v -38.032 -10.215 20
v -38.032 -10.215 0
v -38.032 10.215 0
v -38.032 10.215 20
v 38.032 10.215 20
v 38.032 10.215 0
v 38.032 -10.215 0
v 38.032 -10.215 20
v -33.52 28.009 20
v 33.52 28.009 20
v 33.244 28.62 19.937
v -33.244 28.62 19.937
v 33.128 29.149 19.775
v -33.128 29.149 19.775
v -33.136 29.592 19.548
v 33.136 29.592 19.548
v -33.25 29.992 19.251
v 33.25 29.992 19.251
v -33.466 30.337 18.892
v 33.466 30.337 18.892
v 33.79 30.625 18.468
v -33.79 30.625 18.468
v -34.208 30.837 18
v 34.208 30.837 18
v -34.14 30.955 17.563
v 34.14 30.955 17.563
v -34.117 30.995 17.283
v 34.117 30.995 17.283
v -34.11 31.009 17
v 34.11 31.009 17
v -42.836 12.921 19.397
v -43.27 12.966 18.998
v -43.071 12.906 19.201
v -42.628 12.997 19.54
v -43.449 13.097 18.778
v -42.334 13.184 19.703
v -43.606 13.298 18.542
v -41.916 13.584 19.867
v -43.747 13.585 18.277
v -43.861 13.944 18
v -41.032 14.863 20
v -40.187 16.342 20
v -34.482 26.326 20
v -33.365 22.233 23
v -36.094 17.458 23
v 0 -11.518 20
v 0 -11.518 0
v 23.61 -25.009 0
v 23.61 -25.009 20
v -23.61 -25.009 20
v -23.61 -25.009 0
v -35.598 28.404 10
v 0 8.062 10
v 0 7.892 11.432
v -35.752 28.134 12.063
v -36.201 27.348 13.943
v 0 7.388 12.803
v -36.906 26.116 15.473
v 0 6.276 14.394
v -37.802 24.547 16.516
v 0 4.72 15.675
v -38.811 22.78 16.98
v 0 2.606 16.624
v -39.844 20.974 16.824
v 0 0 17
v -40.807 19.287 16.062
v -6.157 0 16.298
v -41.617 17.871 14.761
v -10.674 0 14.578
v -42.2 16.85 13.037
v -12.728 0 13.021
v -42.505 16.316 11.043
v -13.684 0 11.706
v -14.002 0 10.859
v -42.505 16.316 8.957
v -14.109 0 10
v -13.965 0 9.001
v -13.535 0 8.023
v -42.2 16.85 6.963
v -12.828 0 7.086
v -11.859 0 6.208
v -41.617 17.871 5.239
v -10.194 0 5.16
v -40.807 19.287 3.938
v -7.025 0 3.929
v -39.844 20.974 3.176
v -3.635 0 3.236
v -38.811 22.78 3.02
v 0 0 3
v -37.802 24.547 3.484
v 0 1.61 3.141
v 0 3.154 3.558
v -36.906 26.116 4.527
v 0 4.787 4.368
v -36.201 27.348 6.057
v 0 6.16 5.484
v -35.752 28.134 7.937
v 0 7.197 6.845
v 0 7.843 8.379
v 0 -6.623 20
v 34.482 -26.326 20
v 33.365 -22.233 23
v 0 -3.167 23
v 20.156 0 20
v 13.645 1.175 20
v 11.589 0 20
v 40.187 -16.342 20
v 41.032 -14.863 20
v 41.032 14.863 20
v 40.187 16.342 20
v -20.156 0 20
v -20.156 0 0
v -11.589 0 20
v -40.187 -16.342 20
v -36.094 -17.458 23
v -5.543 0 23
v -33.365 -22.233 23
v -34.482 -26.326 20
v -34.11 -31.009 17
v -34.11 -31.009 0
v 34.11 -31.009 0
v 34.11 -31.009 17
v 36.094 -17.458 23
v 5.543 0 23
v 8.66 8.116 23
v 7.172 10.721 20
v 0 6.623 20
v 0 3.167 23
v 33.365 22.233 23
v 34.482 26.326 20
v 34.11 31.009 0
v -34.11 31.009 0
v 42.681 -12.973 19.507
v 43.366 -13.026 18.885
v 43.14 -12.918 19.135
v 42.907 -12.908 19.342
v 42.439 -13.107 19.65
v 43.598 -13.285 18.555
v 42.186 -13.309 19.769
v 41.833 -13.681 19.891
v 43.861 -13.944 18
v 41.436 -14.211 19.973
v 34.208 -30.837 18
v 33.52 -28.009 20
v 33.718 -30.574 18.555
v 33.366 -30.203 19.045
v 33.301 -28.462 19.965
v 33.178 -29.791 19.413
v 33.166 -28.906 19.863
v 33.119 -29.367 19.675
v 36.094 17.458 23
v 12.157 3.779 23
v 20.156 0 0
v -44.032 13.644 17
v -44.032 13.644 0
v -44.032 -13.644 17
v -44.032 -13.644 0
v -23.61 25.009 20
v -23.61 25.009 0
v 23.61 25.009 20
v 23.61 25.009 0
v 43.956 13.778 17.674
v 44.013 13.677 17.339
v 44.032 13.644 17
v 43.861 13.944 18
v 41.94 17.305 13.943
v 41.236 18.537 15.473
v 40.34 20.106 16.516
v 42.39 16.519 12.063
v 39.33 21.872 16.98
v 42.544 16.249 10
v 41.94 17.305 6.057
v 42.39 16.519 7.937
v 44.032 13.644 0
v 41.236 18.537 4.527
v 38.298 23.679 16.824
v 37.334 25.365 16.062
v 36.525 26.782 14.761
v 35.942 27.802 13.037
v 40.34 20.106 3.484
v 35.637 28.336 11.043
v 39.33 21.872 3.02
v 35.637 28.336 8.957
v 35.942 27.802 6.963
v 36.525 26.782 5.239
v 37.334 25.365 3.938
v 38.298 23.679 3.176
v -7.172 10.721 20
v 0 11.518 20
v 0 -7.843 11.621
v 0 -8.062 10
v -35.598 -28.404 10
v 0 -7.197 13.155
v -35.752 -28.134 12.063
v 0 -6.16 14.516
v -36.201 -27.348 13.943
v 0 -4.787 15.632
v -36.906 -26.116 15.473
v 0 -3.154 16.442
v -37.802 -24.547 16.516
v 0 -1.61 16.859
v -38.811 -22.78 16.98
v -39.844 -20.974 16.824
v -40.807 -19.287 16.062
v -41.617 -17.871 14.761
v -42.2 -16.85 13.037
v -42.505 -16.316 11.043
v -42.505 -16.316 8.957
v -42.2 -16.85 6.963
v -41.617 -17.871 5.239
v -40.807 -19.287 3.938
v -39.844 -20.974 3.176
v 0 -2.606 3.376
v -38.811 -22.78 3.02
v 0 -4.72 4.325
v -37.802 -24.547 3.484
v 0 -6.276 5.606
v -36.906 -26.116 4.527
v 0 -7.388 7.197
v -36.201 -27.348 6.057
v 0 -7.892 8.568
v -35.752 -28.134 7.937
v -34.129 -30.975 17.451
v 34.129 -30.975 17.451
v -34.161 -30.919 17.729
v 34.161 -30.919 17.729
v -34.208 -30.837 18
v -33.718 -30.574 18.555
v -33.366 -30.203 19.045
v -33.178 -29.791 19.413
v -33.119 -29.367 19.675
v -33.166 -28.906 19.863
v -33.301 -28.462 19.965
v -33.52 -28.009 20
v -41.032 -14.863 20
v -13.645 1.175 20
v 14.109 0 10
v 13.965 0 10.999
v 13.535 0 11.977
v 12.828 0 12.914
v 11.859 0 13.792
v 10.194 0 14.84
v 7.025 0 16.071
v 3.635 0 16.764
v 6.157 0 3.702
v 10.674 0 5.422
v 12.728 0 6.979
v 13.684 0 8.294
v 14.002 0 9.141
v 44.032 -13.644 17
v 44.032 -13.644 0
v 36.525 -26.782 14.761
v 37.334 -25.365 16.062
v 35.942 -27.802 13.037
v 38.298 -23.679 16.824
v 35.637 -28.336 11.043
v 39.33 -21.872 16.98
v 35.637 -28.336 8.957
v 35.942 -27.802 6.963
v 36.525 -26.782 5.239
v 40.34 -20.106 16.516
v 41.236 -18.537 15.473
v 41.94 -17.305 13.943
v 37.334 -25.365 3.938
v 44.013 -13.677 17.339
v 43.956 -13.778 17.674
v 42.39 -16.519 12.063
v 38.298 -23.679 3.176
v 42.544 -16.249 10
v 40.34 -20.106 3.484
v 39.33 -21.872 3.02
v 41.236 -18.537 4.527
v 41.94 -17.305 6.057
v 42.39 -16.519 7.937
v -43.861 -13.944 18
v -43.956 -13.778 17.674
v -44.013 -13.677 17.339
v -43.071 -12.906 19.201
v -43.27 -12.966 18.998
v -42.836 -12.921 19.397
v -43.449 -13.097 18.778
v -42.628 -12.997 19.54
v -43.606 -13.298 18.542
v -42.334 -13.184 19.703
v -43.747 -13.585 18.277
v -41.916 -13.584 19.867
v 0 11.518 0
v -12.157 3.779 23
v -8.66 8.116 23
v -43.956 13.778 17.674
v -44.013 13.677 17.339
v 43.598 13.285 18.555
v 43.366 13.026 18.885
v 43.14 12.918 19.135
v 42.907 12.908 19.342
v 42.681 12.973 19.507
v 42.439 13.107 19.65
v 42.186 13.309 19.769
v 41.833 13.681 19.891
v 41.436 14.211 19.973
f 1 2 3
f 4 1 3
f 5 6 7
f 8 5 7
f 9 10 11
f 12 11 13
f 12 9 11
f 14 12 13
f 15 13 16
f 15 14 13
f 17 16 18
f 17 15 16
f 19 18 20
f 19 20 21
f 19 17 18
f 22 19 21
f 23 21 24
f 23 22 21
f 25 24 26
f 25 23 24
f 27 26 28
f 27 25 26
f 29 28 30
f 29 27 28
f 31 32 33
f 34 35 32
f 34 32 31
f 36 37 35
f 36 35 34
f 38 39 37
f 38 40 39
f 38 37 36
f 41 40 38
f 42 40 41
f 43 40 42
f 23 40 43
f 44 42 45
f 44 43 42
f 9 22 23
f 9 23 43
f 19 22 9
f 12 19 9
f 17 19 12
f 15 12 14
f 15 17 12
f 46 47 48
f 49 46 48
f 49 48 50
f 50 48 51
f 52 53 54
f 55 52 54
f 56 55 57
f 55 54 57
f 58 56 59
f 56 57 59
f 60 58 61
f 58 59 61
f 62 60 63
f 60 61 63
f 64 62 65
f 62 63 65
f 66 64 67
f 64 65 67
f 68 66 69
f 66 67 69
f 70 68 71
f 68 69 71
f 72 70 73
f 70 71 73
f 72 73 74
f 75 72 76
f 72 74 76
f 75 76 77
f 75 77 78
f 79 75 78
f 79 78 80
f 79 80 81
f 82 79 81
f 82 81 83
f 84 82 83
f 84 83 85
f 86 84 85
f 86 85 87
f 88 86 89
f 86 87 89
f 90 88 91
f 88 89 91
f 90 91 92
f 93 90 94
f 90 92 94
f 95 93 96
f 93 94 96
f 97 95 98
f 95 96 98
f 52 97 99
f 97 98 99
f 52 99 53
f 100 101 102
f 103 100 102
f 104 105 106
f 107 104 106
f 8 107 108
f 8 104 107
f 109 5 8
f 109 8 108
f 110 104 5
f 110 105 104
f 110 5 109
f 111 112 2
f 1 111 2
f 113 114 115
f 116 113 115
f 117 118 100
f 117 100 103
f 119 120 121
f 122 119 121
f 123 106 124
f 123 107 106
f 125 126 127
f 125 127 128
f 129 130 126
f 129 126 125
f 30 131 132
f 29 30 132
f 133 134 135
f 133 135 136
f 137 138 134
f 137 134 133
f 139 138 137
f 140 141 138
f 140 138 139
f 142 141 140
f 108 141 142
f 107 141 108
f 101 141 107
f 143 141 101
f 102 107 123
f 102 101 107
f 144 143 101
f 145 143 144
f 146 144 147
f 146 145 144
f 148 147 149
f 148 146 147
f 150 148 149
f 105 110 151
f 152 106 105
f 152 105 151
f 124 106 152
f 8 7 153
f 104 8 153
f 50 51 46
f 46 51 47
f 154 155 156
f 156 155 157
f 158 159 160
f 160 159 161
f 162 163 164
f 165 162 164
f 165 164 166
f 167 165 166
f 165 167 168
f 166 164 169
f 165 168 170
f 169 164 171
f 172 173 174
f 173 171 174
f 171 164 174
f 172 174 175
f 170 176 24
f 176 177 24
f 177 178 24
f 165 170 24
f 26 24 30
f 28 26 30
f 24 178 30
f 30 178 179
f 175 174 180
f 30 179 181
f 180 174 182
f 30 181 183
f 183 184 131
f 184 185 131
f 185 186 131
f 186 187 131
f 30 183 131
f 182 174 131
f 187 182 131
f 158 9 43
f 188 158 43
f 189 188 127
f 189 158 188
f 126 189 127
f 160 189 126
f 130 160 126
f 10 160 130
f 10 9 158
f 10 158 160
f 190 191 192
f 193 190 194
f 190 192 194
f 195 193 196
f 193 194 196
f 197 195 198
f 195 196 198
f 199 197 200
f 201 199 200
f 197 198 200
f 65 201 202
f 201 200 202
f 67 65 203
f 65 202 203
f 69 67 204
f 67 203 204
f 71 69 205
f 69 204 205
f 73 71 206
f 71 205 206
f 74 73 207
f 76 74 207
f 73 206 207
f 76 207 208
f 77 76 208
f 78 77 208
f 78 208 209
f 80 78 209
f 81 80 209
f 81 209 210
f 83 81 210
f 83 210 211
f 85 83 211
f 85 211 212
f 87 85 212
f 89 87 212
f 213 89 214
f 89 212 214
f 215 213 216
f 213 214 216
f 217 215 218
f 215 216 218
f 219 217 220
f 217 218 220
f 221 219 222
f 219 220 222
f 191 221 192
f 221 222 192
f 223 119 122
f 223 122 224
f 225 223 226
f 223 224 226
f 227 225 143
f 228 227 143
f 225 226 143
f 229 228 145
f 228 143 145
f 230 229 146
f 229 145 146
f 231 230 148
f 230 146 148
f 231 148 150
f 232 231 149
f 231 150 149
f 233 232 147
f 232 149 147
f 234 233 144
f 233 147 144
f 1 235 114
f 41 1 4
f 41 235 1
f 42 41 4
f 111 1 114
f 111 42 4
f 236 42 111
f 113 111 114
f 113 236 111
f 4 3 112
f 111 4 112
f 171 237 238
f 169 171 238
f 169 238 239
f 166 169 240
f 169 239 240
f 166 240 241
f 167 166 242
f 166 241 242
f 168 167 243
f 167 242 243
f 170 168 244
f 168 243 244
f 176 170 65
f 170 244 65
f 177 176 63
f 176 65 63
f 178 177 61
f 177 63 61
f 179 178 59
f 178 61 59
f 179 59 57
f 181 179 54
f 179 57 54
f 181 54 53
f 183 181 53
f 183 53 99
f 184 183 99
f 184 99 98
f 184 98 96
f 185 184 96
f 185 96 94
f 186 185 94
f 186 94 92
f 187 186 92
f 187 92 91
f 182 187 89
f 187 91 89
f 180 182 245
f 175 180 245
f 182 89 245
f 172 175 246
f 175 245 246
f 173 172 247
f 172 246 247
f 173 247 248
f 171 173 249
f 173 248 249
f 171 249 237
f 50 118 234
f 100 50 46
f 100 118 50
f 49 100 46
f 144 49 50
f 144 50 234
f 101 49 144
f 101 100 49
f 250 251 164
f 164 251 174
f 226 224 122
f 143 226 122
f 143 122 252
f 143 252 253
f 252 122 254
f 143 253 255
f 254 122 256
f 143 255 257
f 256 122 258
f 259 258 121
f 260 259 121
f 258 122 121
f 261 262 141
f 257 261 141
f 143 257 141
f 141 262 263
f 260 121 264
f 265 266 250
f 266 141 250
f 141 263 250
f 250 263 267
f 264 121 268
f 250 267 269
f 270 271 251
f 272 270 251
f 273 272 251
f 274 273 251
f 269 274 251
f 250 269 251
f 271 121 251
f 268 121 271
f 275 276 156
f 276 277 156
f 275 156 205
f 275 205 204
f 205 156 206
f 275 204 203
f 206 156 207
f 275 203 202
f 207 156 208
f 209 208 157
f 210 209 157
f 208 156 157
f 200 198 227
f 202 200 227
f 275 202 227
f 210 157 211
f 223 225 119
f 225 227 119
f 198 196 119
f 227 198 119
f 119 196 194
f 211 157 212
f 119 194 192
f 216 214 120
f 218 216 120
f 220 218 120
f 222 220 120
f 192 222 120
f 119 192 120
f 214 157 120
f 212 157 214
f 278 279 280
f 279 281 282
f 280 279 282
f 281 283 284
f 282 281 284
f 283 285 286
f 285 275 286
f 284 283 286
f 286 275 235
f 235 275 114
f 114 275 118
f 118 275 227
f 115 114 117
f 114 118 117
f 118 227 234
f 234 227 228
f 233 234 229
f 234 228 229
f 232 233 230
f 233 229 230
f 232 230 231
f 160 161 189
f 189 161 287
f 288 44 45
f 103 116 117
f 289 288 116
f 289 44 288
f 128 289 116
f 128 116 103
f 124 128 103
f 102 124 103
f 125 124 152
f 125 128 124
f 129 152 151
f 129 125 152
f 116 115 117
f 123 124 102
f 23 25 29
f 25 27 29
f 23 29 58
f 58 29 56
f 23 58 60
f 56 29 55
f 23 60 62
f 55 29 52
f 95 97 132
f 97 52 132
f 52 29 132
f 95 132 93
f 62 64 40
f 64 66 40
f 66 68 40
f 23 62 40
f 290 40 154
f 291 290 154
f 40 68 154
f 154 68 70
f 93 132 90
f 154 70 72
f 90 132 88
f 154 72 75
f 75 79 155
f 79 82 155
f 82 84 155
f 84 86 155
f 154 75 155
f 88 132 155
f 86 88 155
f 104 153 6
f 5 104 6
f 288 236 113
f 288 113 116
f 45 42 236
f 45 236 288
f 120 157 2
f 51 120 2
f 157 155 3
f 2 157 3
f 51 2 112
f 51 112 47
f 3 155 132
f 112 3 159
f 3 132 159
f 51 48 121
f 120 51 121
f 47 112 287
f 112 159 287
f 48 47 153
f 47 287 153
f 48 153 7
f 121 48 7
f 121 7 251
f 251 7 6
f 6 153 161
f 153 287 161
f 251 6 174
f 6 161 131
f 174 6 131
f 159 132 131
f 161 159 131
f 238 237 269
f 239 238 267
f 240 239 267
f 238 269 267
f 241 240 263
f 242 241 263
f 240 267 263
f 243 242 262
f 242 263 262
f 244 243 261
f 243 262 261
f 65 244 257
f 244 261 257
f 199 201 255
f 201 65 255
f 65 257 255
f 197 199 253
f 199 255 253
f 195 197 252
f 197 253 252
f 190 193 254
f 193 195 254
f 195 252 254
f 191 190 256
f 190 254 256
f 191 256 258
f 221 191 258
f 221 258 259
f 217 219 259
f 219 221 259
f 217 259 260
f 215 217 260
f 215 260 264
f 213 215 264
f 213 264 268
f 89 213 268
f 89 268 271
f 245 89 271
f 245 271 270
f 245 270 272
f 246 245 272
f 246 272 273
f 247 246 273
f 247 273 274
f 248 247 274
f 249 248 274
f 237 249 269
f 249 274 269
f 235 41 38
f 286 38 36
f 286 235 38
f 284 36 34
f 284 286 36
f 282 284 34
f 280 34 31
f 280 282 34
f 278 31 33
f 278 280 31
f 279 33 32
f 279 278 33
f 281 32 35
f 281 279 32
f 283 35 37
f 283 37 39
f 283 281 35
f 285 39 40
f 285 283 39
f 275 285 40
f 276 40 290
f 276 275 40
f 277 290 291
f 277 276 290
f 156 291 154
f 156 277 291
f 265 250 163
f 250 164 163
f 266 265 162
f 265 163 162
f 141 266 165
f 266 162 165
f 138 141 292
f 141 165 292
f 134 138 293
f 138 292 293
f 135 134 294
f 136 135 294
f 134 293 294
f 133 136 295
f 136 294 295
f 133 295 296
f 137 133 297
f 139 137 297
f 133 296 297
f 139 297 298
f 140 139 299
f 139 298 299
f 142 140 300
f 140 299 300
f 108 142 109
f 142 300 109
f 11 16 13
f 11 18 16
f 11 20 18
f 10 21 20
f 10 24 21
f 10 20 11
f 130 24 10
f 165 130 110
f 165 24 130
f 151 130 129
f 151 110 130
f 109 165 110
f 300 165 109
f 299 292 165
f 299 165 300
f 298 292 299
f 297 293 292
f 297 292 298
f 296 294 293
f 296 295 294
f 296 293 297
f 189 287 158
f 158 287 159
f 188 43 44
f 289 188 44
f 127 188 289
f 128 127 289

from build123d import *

# Parameters (mm, degrees)
F1_DEPTH      = 20
F2_R          = 7
F3_DEPTH      = 98.6163846154
F3_DEPTH_BACK = 8.6163846154
F4_R          = 7
F5_DEPTH      = 98.6163846154
F5_DEPTH_BACK = 8.6163846154
F7_DEPTH      = 3
F8_T4_DEPTH   = 57.4298435113
F8_T9_DEPTH   = 57.4298435113
F8_T14_DEPTH  = 56.5459149398
F8_T19_DEPTH  = 56.5459149398
F8_T24_DEPTH  = 56.5459149398
F8_T29_DEPTH  = 56.5459149398
F8_T34_DEPTH  = 57.4298435113
F8_T39_DEPTH  = 57.4298435113
F9_T1_DEPTH   = 31.2168298797
F9_T3_DEPTH   = 31.2168298797
F9_T5_DEPTH   = 31.2168298797
F10_R         = 3


# Not quite as in the source:
# - a fillet or chamfer that OpenCascade refuses, or shapes differently, is made with other operations: its cross-section is extruded or revolved along the edge and cut away or added


with BuildPart() as f1:
    # F0 (on Top) → F1 (new body)
    with BuildSketch(Plane.XY):
        Polygon((-23.609552012, 25.0086836473), (0, 25.0086836473), (23.609552012, 25.0086836473), (34.109552012, 31.0086836473), (-34.109552012, 31.0086836473), align=None)
        Polygon((0, 11.517511069), (-23.609552012, 25.0086836473), (-34.109552012, 31.0086836473), (-44.0323307792, 13.6438208048), (-38.0323307792, 10.2152493762), (-20.1556443707, 0), align=None)
        Polygon((34.109552012, 31.0086836473), (23.609552012, 25.0086836473), (0, 11.517511069), (20.1556443707, 0), (38.0323307792, 10.2152493762), (44.0323307792, 13.6438208048), align=None)
        Polygon((-38.0323307792, 10.2152493762), (-44.0323307792, 13.6438208048), (-44.0323307792, -13.6438208048), (-38.0323307792, -10.2152493762), (-38.0323307792, 0), align=None)
        Polygon((0, -11.517511069), (-20.1556443707, 0), (-38.0323307792, -10.2152493762), (-44.0323307792, -13.6438208048), (-34.109552012, -31.0086836473), (-23.609552012, -25.0086836473), align=None)
        Polygon((38.0323307792, -10.2152493762), (20.1556443707, 0), (0, -11.517511069), (23.609552012, -25.0086836473), (34.109552012, -31.0086836473), (44.0323307792, -13.6438208048), align=None)
        Polygon((44.0323307792, -13.6438208048), (44.0323307792, 13.6438208048), (38.0323307792, 10.2152493762), (38.0323307792, 0), (38.0323307792, -10.2152493762), align=None)
        Polygon((-23.609552012, -25.0086836473), (-34.109552012, -31.0086836473), (34.109552012, -31.0086836473), (23.609552012, -25.0086836473), (0, -25.0086836473), align=None)
        Polygon((20.1556443707, 0), (0, 11.517511069), (-20.1556443707, 0), (0, -11.517511069), align=None)
    extrude(amount=F1_DEPTH)

    # F2 (on face) → F3 (cut, two sides)
    with BuildSketch(Plane(origin=(-39.0709413956, -22.3262522261, 0), x_dir=(0.4961389384, -0.8682431421, 0), z_dir=(-0.8682431421, -0.4961389384, 0))) as f3_sk:
        with Locations((0, 10)):
            Circle(F2_R)
    extrude(amount=-F3_DEPTH, mode=Mode.SUBTRACT)
    extrude(f3_sk.sketch, amount=F3_DEPTH_BACK, mode=Mode.SUBTRACT)

    # F4 (on face) → F5 (cut, two sides)
    with BuildSketch(Plane(origin=(39.0709413956, -22.3262522261, 0), x_dir=(0.4961389384, 0.8682431421, 0), z_dir=(0.8682431421, -0.4961389384, 0))) as f5_sk:
        with Locations((0, 10)):
            Circle(F4_R)
    extrude(amount=-F5_DEPTH, mode=Mode.SUBTRACT)
    extrude(f5_sk.sketch, amount=F5_DEPTH_BACK, mode=Mode.SUBTRACT)

    # F6 (on face) → F7 (join)
    with BuildSketch(Plane.XY.offset(20)):
        Polygon((0, 0.8638133302), (-38.6988371918, 22.9774345827), (-39.0709413956, 22.3262522261), (-39.4430455994, 21.6750698695), (-1.5116733278, 0), align=None)
        Polygon((38.6988371918, 22.9774345827), (0, 0.8638133302), (1.5116733278, 0), (39.4430455994, 21.6750698695), (39.0709413956, 22.3262522261), align=None)
        Polygon((1.5116733278, 0), (0, 0.8638133302), (-1.5116733278, 0), (0, -0.8638133302), align=None)
        Polygon((39.4430455994, -21.6750698695), (1.5116733278, 0), (0, -0.8638133302), (38.6988371918, -22.9774345827), (39.0709413956, -22.3262522261), align=None)
        Polygon((0, -0.8638133302), (-1.5116733278, 0), (-39.4430455994, -21.6750698695), (-39.0709413956, -22.3262522261), (-38.6988371918, -22.9774345827), align=None)
    extrude(amount=F7_DEPTH)

    # F8: chamfer of 5 on 8 edges, made by hand


with BuildPart() as f8_tool2:
    # F8_s3 → F8_t4 (new body)
    with BuildSketch(Plane(origin=(-39.0709413956, -22.3262522261, 0), x_dir=(0, 0, 1), z_dir=(0.8682431421, 0.4961389384, 0))):
        Polygon((20, 5.75), (25, 0.75), (20, 0.75), align=None)
    extrude(amount=F8_T4_DEPTH)

    split(bisect_by=Plane.XY.offset(23), keep=Keep.BOTTOM)


with BuildPart() as f1_1:
    add(f1.part)

    # F8_t1: union F8_tool2
    add(f8_tool2.part)


with BuildPart() as f8_tool7:
    # F8_s8 → F8_t9 (new body)
    with BuildSketch(Plane(origin=(-10.7921263863, 6.1669293636, 0), x_dir=(0, 0, 1), z_dir=(0.8682431421, -0.4961389384, 0))):
        Polygon((20, 5.75), (25, 0.75), (20, 0.75), align=None)
    extrude(amount=F8_T9_DEPTH)

    split(bisect_by=Plane.XY.offset(23), keep=Keep.BOTTOM)


with BuildPart() as f1_2:
    add(f1_1.part)

    # F8_t6: union F8_tool7
    add(f8_tool7.part)


with BuildPart() as f8_tool12:
    # F8_s13 → F8_t14 (new body)
    with BuildSketch(Plane(origin=(10.0246614661, 5.7283779806, 0), x_dir=(0, 0, 1), z_dir=(-0.8682431421, -0.4961389384, 0))):
        Polygon((20, 5.75), (25, 0.75), (20, 0.75), align=None)
    extrude(amount=F8_T14_DEPTH)

    split(bisect_by=Plane.XY.offset(23), keep=Keep.BOTTOM)


with BuildPart() as f1_3:
    add(f1_2.part)

    # F8_t11: union F8_tool12
    add(f8_tool12.part)


with BuildPart() as f8_tool17:
    # F8_s18 → F8_t19 (new body)
    with BuildSketch(Plane(origin=(-39.0709413956, 22.3262522261, 0), x_dir=(0, 0, 1), z_dir=(0.8682431421, -0.4961389384, 0))):
        Polygon((20, 5.75), (25, 0.75), (20, 0.75), align=None)
    extrude(amount=F8_T19_DEPTH)

    split(bisect_by=Plane.XY.offset(23), keep=Keep.BOTTOM)


with BuildPart() as f1_4:
    add(f1_3.part)

    # F8_t16: union F8_tool17
    add(f8_tool17.part)


with BuildPart() as f8_tool22:
    # F8_s23 → F8_t24 (new body)
    with BuildSketch(Plane(origin=(39.0709413956, -22.3262522261, 0), x_dir=(0, 0, 1), z_dir=(-0.8682431421, 0.4961389384, 0))):
        Polygon((20, 5.75), (25, 0.75), (20, 0.75), align=None)
    extrude(amount=F8_T24_DEPTH)

    split(bisect_by=Plane.XY.offset(23), keep=Keep.BOTTOM)


with BuildPart() as f1_5:
    add(f1_4.part)

    # F8_t21: union F8_tool22
    add(f8_tool22.part)


with BuildPart() as f8_tool27:
    # F8_s28 → F8_t29 (new body)
    with BuildSketch(Plane(origin=(-10.0246614661, -5.7283779806, 0), x_dir=(0, 0, 1), z_dir=(0.8682431421, 0.4961389384, 0))):
        Polygon((20, 5.75), (25, 0.75), (20, 0.75), align=None)
    extrude(amount=F8_T29_DEPTH)

    split(bisect_by=Plane.XY.offset(23), keep=Keep.BOTTOM)


with BuildPart() as f1_6:
    add(f1_5.part)

    # F8_t26: union F8_tool27
    add(f8_tool27.part)


with BuildPart() as f8_tool32:
    # F8_s33 → F8_t34 (new body)
    with BuildSketch(Plane(origin=(10.7921263863, -6.1669293636, 0), x_dir=(0, 0, 1), z_dir=(-0.8682431421, 0.4961389384, 0))):
        Polygon((20, 5.75), (25, 0.75), (20, 0.75), align=None)
    extrude(amount=F8_T34_DEPTH)

    split(bisect_by=Plane.XY.offset(23), keep=Keep.BOTTOM)


with BuildPart() as f1_7:
    add(f1_6.part)

    # F8_t31: union F8_tool32
    add(f8_tool32.part)


with BuildPart() as f8_tool37:
    # F8_s38 → F8_t39 (new body)
    with BuildSketch(Plane(origin=(39.0709413956, 22.3262522261, 0), x_dir=(0, 0, 1), z_dir=(-0.8682431421, -0.4961389384, 0))):
        Polygon((20, 5.75), (25, 0.75), (20, 0.75), align=None)
    extrude(amount=F8_T39_DEPTH)

    split(bisect_by=Plane.XY.offset(23), keep=Keep.BOTTOM)


with BuildPart() as f1_8:
    add(f1_7.part)

    # F8_t36: union F8_tool37
    add(f8_tool37.part)

    # F9: chamfer of 5 on 4 edges, made by hand

    # F9_s2 → F9_t1 (cut)
    with BuildSketch(Plane(origin=(7.7439424177, -13.5518992309, 0), x_dir=(0, 0, 1), z_dir=(-0.4961389384, 0.8682431421, 0))):
        Polygon((18, -45), (23, -40), (23, -45), align=None)
        Polygon((18, 45), (23, 40), (23, 45), align=None)
    extrude(amount=F9_T1_DEPTH, mode=Mode.SUBTRACT)

    # F9_s4 → F9_t3 (cut)
    with BuildSketch(Plane(origin=(7.7439424177, 13.5518992309, 0), x_dir=(0, 0, 1), z_dir=(-0.4961389384, -0.8682431421, 0))):
        Polygon((18, 45), (23, 40), (23, 45), align=None)
    extrude(amount=F9_T3_DEPTH, mode=Mode.SUBTRACT)

    # F9_s6 → F9_t5 (cut)
    with BuildSketch(Plane(origin=(-7.7439424177, -13.5518992309, 0), x_dir=(0, 0, 1), z_dir=(0.4961389384, 0.8682431421, 0))):
        Polygon((18, 45), (23, 40), (23, 45), align=None)
    extrude(amount=F9_T5_DEPTH, mode=Mode.SUBTRACT)

    # F10
    f10_edges = [f1_8.edges().sort_by_distance(p)[0] for p in [
        (0, 31.008684, 20),
        (0, -31.008684, 20),
        (-44.032331, 0, 20),
        (44.032331, 0, 20),
    ]]
    fillet(f10_edges, radius=F10_R)


solid = f1_8.part
